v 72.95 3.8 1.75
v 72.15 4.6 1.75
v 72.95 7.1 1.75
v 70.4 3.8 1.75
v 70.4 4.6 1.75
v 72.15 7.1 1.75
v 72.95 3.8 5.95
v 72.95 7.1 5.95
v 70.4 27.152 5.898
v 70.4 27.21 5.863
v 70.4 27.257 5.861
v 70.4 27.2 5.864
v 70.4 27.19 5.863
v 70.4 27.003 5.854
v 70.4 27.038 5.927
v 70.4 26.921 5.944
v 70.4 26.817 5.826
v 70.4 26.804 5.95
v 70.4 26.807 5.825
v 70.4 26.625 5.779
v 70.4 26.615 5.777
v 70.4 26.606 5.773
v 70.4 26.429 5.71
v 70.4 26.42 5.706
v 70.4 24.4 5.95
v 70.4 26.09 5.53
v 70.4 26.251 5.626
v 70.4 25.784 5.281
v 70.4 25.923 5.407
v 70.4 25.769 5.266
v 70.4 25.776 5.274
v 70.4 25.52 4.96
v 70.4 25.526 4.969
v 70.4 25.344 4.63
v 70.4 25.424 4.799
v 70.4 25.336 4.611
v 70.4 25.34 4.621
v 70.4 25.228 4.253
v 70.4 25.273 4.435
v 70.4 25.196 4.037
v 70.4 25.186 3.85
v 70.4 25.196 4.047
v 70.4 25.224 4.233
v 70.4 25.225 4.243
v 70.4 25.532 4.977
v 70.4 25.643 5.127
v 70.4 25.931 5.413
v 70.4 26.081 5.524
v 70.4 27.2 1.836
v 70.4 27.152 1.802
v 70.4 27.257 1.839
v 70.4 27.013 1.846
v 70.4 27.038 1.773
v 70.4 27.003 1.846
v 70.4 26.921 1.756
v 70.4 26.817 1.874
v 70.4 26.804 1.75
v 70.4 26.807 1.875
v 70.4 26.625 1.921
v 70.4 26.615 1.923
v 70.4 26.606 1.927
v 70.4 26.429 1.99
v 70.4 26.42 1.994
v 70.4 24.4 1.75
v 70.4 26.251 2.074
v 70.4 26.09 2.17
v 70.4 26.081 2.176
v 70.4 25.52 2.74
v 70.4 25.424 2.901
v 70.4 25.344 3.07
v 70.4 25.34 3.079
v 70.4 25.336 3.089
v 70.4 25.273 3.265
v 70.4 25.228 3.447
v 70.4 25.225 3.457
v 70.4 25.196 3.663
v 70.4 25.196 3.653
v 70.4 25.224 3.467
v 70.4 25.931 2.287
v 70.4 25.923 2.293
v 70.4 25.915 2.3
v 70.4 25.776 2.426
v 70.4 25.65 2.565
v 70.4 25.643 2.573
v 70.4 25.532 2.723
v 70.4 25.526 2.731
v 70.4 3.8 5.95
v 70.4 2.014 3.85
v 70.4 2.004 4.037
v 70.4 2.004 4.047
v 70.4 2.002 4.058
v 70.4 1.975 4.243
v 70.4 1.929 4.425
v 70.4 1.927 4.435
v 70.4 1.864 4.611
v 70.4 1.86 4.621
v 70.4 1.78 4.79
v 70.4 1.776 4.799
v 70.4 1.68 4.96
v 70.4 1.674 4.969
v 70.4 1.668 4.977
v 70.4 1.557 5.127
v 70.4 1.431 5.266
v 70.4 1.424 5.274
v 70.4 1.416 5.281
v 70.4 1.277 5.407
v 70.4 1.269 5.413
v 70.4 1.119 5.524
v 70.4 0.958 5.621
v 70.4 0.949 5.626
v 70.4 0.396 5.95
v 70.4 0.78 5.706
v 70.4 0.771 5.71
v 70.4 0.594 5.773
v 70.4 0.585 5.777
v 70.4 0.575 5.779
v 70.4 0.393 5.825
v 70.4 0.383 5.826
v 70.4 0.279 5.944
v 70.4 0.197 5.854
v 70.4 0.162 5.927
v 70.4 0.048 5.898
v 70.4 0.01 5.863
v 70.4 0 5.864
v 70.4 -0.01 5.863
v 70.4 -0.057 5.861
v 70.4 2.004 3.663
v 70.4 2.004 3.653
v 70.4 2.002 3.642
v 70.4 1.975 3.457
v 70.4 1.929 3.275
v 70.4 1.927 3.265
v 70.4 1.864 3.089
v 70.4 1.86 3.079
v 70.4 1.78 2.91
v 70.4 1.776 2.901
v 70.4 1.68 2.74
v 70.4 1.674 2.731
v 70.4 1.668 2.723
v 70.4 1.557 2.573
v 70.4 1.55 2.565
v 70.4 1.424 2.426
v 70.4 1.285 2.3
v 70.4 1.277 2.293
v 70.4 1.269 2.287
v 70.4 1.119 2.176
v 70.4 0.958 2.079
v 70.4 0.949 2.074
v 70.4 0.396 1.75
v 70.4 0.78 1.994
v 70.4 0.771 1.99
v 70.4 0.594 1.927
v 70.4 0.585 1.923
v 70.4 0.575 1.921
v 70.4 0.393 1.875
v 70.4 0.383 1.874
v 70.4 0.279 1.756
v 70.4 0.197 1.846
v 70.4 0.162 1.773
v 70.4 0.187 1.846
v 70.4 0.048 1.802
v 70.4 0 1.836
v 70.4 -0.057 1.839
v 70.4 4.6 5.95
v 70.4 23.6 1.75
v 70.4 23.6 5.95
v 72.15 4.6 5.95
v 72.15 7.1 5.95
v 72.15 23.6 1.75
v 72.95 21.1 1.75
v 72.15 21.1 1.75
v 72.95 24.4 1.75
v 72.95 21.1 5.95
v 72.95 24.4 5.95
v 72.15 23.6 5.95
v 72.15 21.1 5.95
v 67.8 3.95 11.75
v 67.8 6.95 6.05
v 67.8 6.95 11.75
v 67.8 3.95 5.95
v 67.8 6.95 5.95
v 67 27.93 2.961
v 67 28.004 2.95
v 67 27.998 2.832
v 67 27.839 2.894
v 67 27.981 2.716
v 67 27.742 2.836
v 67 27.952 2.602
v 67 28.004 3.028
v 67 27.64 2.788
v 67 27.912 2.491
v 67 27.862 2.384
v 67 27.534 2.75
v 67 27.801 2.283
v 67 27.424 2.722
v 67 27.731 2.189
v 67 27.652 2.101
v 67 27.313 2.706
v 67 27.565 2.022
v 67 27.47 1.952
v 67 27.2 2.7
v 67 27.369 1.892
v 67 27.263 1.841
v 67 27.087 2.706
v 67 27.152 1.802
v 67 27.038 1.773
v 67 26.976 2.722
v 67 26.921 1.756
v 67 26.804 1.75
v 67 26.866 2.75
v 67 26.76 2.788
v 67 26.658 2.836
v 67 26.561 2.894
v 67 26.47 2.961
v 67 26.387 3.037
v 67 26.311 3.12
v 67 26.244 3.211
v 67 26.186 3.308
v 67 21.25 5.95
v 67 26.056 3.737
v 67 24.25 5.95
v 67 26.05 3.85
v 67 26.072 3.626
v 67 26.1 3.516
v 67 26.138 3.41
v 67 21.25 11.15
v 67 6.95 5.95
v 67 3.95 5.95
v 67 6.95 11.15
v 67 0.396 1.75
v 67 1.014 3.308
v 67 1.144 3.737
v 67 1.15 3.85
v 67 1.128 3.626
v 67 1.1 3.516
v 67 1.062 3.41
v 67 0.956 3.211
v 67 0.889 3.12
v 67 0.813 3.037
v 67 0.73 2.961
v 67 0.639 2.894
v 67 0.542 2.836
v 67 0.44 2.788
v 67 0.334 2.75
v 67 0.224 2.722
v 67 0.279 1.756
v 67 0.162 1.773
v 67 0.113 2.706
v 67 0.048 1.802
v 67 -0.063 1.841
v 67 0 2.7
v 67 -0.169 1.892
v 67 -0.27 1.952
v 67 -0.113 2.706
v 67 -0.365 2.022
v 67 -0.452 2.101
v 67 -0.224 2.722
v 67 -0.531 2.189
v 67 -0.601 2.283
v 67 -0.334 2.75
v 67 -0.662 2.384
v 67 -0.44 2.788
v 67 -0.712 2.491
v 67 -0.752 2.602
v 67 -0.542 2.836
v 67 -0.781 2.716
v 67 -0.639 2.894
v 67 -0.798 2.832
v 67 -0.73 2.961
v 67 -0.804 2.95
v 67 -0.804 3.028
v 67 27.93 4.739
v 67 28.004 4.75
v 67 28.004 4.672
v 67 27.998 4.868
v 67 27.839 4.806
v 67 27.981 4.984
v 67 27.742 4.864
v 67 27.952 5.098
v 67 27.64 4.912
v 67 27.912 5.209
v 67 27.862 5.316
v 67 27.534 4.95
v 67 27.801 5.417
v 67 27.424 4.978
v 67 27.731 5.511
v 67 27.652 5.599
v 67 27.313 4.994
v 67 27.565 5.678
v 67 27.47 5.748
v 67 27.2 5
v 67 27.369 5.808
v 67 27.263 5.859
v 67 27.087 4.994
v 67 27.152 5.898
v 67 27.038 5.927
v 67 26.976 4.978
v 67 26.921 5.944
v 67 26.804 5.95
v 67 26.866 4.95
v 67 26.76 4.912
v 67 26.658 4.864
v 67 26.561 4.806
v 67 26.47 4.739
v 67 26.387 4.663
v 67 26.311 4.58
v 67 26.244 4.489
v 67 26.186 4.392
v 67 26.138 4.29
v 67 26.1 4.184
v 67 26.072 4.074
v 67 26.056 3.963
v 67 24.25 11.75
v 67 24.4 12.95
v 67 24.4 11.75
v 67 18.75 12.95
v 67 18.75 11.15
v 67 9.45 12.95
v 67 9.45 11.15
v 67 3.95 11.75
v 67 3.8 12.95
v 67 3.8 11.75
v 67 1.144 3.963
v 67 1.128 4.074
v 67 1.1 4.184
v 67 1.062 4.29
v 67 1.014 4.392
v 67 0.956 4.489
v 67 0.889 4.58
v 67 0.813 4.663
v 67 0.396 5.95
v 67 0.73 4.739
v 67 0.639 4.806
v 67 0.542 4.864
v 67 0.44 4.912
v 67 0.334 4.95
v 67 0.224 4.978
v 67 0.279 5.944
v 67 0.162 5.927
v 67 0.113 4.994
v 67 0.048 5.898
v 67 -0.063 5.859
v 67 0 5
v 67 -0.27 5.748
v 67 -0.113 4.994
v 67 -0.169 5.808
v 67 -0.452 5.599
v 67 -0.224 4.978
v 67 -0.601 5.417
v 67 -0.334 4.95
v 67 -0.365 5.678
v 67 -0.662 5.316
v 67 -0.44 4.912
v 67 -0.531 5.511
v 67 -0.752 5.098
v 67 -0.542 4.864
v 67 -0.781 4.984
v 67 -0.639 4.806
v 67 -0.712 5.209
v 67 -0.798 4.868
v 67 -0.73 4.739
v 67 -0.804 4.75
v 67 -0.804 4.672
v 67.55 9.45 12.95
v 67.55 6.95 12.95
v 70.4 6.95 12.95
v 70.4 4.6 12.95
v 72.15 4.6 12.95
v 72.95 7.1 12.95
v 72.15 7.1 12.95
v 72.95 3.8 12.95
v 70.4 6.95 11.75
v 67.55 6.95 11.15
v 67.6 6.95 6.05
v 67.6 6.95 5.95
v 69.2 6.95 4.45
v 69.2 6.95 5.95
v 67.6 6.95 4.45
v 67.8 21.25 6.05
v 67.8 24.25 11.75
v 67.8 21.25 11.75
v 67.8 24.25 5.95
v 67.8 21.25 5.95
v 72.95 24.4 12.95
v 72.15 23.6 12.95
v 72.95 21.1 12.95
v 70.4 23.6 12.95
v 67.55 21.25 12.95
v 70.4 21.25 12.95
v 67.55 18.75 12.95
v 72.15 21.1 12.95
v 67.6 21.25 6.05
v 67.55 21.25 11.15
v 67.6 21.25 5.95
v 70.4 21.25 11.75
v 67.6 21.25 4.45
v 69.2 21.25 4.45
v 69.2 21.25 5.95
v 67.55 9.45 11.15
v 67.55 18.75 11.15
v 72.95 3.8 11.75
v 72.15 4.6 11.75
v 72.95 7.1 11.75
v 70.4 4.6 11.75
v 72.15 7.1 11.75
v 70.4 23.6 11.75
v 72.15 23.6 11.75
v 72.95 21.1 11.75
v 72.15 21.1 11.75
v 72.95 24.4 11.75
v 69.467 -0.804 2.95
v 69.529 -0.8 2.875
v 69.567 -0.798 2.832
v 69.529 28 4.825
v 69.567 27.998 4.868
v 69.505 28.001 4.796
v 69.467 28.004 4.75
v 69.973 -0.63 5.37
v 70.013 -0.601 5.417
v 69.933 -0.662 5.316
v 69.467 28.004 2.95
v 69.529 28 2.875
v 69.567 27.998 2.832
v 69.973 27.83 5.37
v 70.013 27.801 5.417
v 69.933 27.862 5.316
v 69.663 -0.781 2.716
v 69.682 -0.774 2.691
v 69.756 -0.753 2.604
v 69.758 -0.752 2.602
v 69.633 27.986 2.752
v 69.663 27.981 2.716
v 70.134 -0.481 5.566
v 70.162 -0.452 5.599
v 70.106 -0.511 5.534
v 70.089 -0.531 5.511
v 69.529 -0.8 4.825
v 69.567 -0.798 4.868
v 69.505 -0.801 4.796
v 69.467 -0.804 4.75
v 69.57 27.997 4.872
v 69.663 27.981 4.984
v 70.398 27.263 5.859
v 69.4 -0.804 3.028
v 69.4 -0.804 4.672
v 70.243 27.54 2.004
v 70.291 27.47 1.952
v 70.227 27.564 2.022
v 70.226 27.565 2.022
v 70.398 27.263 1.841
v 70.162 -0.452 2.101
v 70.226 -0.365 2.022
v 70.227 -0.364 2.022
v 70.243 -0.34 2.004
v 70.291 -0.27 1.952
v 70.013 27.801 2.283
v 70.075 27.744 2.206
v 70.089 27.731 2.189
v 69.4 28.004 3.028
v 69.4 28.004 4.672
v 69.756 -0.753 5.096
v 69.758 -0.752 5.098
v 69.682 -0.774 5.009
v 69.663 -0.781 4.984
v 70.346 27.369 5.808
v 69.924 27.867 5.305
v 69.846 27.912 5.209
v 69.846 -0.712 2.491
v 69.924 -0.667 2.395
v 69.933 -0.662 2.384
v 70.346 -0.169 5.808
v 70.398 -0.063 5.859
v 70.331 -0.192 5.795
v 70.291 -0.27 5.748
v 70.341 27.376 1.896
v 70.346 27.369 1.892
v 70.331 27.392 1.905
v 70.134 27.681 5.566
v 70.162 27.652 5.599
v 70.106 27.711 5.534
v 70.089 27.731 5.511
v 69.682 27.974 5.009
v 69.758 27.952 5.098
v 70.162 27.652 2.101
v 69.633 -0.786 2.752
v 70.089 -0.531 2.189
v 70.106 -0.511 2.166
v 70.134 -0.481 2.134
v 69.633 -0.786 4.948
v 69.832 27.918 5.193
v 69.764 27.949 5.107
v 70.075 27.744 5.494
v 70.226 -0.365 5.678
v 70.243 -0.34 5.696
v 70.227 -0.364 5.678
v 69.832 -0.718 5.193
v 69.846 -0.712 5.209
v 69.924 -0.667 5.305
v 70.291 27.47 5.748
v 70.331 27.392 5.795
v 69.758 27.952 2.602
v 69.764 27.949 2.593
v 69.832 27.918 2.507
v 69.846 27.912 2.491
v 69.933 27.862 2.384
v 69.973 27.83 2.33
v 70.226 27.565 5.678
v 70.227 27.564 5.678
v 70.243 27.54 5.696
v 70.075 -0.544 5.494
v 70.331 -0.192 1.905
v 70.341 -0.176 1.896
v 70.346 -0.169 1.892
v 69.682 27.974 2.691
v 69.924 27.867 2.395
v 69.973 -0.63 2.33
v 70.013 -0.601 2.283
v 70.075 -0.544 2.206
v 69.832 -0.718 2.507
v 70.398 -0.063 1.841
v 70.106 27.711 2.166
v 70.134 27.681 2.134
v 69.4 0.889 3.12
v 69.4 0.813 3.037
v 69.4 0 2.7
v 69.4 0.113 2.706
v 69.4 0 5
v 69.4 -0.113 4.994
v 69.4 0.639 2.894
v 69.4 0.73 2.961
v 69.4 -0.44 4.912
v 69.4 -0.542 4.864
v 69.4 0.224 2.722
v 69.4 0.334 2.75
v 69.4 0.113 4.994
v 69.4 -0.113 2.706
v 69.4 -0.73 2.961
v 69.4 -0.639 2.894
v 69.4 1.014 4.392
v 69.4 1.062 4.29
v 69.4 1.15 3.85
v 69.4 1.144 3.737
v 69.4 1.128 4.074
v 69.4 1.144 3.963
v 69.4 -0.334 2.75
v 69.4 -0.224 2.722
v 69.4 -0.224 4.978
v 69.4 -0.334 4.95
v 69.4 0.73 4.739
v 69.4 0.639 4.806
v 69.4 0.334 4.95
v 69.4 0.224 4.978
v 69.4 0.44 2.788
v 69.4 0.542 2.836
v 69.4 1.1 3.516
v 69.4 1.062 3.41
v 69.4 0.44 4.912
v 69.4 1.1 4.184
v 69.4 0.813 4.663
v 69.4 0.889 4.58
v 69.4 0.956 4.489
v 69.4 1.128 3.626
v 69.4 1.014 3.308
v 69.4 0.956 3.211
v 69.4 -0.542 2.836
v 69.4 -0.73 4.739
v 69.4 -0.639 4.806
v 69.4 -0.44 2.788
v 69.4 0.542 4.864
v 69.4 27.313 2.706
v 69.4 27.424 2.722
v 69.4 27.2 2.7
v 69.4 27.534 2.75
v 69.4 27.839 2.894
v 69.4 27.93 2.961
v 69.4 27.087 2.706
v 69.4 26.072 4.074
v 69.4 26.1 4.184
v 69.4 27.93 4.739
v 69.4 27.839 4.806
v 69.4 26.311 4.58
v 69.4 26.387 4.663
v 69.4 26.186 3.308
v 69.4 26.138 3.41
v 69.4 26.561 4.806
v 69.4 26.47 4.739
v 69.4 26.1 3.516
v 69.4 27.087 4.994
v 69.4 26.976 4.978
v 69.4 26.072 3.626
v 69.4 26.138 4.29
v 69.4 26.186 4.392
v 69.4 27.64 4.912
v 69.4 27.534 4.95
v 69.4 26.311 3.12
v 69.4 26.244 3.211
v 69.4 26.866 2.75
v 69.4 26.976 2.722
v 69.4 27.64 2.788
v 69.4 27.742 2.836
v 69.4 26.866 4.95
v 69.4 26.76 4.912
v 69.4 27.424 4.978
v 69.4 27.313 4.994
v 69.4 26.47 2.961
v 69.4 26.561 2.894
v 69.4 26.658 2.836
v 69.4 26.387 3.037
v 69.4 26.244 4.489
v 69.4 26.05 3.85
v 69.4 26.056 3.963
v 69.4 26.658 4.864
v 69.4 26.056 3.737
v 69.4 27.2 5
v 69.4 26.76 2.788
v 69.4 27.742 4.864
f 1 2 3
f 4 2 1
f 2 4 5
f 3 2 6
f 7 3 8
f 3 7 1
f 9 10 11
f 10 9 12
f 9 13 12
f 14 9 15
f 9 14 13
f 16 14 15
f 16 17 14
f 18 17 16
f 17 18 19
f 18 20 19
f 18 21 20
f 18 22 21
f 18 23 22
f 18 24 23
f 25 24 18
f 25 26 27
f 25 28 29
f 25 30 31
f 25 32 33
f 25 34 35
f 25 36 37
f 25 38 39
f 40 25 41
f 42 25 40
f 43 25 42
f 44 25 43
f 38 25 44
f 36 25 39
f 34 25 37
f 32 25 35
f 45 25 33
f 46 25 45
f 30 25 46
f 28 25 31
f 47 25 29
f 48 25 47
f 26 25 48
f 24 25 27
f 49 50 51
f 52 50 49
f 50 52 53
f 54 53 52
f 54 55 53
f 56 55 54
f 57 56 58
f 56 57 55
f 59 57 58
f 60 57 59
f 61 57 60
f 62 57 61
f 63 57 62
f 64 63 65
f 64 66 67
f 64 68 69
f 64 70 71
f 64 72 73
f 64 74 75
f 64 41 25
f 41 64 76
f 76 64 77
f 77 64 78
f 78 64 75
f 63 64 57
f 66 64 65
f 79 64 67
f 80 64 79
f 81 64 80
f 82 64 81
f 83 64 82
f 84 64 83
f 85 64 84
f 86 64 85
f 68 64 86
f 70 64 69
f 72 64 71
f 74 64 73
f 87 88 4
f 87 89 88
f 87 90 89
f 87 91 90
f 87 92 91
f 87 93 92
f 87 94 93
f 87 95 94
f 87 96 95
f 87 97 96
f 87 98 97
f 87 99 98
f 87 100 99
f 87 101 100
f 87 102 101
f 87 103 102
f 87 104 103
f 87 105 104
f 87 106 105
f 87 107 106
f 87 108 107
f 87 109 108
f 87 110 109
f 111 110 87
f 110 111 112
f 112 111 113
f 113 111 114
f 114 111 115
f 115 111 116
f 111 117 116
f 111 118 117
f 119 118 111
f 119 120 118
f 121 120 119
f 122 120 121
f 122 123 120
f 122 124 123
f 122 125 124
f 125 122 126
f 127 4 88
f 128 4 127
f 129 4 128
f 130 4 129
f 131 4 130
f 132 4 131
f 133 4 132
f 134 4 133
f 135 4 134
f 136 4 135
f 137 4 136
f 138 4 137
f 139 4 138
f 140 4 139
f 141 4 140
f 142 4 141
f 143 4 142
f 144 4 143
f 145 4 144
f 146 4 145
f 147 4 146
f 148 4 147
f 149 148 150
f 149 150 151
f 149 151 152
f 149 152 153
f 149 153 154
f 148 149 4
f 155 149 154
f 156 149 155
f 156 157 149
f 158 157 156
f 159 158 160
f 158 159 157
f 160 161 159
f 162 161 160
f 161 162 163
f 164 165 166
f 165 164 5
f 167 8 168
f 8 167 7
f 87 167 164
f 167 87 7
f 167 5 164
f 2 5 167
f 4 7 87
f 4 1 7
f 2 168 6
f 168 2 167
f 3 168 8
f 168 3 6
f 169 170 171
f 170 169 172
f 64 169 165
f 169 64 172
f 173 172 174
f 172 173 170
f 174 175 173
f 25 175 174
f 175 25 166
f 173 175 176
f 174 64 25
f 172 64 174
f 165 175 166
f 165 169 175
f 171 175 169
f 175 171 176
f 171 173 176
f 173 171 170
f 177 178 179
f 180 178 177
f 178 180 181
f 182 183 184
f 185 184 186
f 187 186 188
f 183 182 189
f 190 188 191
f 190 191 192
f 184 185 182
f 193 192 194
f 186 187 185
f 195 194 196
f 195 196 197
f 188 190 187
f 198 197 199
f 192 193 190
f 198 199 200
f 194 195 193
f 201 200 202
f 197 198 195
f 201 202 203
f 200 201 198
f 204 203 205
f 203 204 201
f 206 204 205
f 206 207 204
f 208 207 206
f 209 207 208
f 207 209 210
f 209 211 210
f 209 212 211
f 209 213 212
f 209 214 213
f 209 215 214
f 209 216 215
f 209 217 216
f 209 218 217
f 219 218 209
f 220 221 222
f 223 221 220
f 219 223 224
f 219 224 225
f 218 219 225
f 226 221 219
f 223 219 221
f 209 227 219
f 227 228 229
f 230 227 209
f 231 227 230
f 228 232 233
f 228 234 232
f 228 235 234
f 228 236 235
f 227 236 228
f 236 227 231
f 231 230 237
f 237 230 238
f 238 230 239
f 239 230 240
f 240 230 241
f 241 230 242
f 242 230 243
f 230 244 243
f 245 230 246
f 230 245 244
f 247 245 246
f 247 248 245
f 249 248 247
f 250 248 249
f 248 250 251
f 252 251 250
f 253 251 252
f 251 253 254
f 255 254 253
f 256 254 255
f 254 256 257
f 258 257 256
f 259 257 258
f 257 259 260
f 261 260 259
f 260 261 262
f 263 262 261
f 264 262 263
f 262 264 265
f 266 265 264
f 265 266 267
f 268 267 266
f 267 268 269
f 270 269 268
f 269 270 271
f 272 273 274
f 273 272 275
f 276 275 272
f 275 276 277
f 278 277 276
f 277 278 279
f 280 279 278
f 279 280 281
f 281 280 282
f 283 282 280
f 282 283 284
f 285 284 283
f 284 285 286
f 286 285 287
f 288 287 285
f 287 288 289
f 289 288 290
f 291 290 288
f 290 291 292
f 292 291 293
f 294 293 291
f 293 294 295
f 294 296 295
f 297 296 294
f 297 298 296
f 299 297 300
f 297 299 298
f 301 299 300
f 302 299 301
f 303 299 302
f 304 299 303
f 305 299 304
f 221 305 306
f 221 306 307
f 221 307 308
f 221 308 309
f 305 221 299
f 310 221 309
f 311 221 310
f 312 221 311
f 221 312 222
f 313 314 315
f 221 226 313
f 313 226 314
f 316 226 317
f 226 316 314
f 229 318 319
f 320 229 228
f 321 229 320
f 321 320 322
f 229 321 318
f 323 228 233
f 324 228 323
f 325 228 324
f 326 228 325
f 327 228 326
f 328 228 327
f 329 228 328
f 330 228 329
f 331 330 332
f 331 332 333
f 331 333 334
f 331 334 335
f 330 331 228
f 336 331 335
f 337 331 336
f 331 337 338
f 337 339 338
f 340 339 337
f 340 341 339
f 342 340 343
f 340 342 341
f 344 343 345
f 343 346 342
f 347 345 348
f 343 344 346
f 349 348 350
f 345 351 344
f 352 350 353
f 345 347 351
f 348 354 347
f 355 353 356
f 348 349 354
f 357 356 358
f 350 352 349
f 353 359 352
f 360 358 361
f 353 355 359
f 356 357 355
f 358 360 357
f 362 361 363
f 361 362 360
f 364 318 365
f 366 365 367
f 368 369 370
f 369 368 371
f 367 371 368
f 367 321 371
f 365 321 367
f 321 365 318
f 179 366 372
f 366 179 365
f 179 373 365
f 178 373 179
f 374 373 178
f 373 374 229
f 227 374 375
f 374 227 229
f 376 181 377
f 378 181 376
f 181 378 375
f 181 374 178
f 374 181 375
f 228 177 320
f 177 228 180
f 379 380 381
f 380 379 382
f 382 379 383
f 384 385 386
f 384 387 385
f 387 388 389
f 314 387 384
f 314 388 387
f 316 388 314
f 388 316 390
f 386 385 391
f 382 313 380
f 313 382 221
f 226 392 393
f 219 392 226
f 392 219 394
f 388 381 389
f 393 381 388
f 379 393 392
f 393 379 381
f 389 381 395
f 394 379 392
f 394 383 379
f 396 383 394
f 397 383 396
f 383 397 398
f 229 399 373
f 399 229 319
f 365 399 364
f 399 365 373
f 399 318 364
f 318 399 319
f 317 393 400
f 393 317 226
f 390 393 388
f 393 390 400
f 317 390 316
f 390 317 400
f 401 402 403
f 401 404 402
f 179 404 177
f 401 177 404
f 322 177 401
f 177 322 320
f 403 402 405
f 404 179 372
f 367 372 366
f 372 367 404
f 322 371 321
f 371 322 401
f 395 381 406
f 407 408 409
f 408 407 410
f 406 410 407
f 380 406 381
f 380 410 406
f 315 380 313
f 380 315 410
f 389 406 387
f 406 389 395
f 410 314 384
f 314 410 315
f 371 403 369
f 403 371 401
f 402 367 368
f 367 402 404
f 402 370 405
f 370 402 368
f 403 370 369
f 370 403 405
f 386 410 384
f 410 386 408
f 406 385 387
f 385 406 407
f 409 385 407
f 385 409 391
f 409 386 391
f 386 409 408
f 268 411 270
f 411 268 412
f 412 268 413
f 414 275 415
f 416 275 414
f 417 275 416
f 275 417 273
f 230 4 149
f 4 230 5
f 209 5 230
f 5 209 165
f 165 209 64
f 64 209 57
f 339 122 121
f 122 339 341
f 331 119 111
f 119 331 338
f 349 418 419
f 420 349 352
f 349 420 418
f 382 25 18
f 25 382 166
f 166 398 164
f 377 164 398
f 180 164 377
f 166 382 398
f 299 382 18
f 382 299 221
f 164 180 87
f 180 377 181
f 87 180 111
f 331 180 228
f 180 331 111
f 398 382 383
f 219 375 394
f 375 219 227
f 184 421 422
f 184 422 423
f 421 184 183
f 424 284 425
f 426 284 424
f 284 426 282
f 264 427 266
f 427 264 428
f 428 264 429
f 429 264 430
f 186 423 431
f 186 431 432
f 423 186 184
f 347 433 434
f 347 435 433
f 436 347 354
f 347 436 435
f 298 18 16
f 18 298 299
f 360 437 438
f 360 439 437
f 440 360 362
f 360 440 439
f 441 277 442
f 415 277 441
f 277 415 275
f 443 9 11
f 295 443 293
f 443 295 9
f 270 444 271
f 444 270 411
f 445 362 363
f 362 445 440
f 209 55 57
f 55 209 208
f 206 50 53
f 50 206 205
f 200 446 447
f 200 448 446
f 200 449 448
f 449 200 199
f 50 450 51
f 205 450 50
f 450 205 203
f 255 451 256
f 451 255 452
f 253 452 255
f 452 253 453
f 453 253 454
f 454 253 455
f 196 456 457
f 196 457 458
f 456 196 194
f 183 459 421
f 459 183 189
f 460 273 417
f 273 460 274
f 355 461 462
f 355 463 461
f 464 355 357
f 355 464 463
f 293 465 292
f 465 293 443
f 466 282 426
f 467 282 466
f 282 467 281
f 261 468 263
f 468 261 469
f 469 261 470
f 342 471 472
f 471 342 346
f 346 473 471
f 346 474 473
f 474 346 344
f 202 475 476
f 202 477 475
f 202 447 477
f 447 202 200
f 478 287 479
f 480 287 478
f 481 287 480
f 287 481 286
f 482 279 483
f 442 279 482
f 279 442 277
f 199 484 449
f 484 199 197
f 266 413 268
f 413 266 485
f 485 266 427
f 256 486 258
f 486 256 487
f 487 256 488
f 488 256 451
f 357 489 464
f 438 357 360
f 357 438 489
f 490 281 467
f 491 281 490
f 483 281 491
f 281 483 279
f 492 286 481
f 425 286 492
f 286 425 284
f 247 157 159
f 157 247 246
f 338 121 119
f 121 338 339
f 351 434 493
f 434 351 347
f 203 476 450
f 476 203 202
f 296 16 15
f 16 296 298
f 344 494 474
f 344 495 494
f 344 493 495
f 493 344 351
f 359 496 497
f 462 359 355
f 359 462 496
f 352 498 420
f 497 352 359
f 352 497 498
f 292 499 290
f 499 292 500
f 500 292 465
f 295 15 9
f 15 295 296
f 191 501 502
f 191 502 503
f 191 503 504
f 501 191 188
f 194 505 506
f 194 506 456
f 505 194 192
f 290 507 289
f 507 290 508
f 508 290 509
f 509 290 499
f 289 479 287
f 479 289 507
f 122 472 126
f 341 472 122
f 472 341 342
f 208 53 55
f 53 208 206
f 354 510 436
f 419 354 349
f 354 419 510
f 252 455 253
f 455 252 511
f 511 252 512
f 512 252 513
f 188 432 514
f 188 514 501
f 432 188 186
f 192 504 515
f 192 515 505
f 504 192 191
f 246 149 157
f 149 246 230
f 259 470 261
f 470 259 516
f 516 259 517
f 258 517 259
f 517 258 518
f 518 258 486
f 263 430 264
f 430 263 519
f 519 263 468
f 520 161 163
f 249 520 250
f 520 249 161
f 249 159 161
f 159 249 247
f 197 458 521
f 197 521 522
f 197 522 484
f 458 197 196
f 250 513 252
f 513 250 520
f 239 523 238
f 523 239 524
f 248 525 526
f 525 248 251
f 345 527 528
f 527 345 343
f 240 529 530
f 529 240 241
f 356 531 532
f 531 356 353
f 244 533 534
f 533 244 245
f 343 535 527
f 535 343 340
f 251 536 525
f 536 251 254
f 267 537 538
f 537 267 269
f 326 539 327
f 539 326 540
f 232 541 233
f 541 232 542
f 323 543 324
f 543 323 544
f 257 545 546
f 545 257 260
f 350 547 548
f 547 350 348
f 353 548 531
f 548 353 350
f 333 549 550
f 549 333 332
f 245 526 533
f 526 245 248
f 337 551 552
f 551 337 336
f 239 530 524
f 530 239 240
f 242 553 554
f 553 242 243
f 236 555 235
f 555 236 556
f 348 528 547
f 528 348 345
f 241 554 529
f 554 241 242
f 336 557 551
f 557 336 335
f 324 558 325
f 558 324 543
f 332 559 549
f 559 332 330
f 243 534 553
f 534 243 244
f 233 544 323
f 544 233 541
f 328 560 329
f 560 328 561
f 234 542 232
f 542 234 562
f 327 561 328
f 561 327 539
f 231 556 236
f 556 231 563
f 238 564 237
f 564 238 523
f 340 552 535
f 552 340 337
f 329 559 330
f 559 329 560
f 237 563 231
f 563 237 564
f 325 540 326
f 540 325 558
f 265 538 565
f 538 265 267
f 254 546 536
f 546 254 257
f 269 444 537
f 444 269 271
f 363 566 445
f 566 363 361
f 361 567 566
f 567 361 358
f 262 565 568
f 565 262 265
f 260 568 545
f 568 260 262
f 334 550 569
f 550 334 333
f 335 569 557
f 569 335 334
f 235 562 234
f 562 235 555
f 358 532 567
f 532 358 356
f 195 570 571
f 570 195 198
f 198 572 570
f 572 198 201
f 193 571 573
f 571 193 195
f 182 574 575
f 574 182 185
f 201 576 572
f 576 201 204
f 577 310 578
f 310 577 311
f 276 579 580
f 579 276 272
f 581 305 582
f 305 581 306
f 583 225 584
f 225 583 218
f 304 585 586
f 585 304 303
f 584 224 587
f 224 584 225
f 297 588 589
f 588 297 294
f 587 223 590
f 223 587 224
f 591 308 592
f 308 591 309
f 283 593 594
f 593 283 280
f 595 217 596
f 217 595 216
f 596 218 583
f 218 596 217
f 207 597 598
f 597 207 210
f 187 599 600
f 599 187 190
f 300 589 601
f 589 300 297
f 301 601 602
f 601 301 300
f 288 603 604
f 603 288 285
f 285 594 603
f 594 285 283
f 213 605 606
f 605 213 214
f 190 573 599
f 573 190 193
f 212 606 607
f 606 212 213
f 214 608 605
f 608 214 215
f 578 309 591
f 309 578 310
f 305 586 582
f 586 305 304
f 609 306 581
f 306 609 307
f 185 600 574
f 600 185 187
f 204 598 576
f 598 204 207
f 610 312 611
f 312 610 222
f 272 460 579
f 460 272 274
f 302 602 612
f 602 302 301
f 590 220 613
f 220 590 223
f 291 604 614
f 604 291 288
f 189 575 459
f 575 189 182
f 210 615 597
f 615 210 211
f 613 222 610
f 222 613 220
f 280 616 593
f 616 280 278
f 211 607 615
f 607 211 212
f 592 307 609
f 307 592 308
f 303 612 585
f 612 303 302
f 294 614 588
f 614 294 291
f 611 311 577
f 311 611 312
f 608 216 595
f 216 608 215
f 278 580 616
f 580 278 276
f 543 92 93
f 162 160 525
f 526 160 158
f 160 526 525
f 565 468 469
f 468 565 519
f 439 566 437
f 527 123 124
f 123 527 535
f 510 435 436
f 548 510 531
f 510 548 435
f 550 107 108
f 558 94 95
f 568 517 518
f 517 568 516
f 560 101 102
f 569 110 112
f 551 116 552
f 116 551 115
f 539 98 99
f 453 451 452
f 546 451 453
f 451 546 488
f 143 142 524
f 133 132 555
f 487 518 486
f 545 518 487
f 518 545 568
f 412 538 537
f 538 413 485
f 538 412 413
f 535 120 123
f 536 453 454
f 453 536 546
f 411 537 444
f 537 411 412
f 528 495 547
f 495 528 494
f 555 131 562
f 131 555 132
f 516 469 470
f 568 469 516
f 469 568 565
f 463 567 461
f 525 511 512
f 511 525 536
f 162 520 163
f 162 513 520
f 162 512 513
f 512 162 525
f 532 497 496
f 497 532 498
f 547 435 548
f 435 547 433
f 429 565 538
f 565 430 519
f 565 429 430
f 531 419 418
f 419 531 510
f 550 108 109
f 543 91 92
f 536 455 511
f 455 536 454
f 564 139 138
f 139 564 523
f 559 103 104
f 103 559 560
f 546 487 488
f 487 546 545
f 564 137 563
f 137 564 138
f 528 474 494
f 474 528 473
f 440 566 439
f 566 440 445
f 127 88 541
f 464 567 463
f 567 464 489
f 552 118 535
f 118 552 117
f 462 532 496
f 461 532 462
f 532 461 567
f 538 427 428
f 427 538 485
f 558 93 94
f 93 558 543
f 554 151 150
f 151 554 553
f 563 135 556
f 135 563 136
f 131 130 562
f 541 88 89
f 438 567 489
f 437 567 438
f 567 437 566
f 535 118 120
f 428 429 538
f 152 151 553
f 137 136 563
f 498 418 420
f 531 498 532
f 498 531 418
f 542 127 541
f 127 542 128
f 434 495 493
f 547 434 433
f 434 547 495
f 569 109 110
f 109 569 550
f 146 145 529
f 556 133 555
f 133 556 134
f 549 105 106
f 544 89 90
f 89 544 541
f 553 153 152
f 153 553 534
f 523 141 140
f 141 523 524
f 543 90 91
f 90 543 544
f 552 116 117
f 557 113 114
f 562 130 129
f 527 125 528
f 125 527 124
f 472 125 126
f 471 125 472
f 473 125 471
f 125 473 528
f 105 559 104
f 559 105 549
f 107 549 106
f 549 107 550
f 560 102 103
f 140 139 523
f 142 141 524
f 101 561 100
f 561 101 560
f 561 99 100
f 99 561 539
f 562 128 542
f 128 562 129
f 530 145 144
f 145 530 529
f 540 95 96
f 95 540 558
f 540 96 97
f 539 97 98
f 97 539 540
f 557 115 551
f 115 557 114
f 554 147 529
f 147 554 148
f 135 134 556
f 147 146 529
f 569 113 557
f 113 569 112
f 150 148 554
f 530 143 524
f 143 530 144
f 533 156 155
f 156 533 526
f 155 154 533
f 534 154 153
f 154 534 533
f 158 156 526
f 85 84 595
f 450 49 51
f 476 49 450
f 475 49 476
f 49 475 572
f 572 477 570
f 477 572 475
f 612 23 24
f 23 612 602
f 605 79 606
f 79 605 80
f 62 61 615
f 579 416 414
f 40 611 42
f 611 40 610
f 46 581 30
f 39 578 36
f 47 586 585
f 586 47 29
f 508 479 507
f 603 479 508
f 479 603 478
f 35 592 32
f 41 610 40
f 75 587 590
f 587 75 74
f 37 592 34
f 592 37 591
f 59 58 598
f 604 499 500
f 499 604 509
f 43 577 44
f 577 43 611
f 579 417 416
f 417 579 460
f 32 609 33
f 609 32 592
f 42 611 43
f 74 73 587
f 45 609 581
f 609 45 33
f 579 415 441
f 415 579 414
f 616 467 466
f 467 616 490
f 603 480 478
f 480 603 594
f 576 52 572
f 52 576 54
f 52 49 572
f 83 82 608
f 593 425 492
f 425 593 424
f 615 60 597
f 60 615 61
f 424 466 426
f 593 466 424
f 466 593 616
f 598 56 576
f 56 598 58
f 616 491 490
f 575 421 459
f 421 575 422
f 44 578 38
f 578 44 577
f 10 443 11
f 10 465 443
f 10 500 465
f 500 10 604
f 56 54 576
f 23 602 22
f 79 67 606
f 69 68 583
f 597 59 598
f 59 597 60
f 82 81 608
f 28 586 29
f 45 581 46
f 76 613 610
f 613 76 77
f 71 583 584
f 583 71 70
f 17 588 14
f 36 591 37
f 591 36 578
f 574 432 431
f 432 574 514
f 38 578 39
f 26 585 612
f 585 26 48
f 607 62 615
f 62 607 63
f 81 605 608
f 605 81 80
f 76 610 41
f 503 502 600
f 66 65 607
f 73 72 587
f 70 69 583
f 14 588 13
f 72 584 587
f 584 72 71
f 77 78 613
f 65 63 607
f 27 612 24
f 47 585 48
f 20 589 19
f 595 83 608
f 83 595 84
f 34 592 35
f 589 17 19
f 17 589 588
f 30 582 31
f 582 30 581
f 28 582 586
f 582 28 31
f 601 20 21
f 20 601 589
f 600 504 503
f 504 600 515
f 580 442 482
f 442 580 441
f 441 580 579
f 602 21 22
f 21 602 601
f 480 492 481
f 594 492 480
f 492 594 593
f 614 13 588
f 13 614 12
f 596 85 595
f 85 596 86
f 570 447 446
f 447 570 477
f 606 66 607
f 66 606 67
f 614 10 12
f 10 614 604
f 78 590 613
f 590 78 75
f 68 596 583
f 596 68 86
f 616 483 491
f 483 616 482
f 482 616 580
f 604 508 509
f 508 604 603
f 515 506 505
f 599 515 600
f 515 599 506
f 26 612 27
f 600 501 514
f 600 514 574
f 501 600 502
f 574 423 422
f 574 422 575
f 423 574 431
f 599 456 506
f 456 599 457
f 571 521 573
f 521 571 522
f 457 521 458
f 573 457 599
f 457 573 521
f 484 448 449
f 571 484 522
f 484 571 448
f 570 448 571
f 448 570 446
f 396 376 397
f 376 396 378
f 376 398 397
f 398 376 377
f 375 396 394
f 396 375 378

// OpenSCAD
part_override = "tp4056_clamp";
include <powersniffer2_case.scad>
